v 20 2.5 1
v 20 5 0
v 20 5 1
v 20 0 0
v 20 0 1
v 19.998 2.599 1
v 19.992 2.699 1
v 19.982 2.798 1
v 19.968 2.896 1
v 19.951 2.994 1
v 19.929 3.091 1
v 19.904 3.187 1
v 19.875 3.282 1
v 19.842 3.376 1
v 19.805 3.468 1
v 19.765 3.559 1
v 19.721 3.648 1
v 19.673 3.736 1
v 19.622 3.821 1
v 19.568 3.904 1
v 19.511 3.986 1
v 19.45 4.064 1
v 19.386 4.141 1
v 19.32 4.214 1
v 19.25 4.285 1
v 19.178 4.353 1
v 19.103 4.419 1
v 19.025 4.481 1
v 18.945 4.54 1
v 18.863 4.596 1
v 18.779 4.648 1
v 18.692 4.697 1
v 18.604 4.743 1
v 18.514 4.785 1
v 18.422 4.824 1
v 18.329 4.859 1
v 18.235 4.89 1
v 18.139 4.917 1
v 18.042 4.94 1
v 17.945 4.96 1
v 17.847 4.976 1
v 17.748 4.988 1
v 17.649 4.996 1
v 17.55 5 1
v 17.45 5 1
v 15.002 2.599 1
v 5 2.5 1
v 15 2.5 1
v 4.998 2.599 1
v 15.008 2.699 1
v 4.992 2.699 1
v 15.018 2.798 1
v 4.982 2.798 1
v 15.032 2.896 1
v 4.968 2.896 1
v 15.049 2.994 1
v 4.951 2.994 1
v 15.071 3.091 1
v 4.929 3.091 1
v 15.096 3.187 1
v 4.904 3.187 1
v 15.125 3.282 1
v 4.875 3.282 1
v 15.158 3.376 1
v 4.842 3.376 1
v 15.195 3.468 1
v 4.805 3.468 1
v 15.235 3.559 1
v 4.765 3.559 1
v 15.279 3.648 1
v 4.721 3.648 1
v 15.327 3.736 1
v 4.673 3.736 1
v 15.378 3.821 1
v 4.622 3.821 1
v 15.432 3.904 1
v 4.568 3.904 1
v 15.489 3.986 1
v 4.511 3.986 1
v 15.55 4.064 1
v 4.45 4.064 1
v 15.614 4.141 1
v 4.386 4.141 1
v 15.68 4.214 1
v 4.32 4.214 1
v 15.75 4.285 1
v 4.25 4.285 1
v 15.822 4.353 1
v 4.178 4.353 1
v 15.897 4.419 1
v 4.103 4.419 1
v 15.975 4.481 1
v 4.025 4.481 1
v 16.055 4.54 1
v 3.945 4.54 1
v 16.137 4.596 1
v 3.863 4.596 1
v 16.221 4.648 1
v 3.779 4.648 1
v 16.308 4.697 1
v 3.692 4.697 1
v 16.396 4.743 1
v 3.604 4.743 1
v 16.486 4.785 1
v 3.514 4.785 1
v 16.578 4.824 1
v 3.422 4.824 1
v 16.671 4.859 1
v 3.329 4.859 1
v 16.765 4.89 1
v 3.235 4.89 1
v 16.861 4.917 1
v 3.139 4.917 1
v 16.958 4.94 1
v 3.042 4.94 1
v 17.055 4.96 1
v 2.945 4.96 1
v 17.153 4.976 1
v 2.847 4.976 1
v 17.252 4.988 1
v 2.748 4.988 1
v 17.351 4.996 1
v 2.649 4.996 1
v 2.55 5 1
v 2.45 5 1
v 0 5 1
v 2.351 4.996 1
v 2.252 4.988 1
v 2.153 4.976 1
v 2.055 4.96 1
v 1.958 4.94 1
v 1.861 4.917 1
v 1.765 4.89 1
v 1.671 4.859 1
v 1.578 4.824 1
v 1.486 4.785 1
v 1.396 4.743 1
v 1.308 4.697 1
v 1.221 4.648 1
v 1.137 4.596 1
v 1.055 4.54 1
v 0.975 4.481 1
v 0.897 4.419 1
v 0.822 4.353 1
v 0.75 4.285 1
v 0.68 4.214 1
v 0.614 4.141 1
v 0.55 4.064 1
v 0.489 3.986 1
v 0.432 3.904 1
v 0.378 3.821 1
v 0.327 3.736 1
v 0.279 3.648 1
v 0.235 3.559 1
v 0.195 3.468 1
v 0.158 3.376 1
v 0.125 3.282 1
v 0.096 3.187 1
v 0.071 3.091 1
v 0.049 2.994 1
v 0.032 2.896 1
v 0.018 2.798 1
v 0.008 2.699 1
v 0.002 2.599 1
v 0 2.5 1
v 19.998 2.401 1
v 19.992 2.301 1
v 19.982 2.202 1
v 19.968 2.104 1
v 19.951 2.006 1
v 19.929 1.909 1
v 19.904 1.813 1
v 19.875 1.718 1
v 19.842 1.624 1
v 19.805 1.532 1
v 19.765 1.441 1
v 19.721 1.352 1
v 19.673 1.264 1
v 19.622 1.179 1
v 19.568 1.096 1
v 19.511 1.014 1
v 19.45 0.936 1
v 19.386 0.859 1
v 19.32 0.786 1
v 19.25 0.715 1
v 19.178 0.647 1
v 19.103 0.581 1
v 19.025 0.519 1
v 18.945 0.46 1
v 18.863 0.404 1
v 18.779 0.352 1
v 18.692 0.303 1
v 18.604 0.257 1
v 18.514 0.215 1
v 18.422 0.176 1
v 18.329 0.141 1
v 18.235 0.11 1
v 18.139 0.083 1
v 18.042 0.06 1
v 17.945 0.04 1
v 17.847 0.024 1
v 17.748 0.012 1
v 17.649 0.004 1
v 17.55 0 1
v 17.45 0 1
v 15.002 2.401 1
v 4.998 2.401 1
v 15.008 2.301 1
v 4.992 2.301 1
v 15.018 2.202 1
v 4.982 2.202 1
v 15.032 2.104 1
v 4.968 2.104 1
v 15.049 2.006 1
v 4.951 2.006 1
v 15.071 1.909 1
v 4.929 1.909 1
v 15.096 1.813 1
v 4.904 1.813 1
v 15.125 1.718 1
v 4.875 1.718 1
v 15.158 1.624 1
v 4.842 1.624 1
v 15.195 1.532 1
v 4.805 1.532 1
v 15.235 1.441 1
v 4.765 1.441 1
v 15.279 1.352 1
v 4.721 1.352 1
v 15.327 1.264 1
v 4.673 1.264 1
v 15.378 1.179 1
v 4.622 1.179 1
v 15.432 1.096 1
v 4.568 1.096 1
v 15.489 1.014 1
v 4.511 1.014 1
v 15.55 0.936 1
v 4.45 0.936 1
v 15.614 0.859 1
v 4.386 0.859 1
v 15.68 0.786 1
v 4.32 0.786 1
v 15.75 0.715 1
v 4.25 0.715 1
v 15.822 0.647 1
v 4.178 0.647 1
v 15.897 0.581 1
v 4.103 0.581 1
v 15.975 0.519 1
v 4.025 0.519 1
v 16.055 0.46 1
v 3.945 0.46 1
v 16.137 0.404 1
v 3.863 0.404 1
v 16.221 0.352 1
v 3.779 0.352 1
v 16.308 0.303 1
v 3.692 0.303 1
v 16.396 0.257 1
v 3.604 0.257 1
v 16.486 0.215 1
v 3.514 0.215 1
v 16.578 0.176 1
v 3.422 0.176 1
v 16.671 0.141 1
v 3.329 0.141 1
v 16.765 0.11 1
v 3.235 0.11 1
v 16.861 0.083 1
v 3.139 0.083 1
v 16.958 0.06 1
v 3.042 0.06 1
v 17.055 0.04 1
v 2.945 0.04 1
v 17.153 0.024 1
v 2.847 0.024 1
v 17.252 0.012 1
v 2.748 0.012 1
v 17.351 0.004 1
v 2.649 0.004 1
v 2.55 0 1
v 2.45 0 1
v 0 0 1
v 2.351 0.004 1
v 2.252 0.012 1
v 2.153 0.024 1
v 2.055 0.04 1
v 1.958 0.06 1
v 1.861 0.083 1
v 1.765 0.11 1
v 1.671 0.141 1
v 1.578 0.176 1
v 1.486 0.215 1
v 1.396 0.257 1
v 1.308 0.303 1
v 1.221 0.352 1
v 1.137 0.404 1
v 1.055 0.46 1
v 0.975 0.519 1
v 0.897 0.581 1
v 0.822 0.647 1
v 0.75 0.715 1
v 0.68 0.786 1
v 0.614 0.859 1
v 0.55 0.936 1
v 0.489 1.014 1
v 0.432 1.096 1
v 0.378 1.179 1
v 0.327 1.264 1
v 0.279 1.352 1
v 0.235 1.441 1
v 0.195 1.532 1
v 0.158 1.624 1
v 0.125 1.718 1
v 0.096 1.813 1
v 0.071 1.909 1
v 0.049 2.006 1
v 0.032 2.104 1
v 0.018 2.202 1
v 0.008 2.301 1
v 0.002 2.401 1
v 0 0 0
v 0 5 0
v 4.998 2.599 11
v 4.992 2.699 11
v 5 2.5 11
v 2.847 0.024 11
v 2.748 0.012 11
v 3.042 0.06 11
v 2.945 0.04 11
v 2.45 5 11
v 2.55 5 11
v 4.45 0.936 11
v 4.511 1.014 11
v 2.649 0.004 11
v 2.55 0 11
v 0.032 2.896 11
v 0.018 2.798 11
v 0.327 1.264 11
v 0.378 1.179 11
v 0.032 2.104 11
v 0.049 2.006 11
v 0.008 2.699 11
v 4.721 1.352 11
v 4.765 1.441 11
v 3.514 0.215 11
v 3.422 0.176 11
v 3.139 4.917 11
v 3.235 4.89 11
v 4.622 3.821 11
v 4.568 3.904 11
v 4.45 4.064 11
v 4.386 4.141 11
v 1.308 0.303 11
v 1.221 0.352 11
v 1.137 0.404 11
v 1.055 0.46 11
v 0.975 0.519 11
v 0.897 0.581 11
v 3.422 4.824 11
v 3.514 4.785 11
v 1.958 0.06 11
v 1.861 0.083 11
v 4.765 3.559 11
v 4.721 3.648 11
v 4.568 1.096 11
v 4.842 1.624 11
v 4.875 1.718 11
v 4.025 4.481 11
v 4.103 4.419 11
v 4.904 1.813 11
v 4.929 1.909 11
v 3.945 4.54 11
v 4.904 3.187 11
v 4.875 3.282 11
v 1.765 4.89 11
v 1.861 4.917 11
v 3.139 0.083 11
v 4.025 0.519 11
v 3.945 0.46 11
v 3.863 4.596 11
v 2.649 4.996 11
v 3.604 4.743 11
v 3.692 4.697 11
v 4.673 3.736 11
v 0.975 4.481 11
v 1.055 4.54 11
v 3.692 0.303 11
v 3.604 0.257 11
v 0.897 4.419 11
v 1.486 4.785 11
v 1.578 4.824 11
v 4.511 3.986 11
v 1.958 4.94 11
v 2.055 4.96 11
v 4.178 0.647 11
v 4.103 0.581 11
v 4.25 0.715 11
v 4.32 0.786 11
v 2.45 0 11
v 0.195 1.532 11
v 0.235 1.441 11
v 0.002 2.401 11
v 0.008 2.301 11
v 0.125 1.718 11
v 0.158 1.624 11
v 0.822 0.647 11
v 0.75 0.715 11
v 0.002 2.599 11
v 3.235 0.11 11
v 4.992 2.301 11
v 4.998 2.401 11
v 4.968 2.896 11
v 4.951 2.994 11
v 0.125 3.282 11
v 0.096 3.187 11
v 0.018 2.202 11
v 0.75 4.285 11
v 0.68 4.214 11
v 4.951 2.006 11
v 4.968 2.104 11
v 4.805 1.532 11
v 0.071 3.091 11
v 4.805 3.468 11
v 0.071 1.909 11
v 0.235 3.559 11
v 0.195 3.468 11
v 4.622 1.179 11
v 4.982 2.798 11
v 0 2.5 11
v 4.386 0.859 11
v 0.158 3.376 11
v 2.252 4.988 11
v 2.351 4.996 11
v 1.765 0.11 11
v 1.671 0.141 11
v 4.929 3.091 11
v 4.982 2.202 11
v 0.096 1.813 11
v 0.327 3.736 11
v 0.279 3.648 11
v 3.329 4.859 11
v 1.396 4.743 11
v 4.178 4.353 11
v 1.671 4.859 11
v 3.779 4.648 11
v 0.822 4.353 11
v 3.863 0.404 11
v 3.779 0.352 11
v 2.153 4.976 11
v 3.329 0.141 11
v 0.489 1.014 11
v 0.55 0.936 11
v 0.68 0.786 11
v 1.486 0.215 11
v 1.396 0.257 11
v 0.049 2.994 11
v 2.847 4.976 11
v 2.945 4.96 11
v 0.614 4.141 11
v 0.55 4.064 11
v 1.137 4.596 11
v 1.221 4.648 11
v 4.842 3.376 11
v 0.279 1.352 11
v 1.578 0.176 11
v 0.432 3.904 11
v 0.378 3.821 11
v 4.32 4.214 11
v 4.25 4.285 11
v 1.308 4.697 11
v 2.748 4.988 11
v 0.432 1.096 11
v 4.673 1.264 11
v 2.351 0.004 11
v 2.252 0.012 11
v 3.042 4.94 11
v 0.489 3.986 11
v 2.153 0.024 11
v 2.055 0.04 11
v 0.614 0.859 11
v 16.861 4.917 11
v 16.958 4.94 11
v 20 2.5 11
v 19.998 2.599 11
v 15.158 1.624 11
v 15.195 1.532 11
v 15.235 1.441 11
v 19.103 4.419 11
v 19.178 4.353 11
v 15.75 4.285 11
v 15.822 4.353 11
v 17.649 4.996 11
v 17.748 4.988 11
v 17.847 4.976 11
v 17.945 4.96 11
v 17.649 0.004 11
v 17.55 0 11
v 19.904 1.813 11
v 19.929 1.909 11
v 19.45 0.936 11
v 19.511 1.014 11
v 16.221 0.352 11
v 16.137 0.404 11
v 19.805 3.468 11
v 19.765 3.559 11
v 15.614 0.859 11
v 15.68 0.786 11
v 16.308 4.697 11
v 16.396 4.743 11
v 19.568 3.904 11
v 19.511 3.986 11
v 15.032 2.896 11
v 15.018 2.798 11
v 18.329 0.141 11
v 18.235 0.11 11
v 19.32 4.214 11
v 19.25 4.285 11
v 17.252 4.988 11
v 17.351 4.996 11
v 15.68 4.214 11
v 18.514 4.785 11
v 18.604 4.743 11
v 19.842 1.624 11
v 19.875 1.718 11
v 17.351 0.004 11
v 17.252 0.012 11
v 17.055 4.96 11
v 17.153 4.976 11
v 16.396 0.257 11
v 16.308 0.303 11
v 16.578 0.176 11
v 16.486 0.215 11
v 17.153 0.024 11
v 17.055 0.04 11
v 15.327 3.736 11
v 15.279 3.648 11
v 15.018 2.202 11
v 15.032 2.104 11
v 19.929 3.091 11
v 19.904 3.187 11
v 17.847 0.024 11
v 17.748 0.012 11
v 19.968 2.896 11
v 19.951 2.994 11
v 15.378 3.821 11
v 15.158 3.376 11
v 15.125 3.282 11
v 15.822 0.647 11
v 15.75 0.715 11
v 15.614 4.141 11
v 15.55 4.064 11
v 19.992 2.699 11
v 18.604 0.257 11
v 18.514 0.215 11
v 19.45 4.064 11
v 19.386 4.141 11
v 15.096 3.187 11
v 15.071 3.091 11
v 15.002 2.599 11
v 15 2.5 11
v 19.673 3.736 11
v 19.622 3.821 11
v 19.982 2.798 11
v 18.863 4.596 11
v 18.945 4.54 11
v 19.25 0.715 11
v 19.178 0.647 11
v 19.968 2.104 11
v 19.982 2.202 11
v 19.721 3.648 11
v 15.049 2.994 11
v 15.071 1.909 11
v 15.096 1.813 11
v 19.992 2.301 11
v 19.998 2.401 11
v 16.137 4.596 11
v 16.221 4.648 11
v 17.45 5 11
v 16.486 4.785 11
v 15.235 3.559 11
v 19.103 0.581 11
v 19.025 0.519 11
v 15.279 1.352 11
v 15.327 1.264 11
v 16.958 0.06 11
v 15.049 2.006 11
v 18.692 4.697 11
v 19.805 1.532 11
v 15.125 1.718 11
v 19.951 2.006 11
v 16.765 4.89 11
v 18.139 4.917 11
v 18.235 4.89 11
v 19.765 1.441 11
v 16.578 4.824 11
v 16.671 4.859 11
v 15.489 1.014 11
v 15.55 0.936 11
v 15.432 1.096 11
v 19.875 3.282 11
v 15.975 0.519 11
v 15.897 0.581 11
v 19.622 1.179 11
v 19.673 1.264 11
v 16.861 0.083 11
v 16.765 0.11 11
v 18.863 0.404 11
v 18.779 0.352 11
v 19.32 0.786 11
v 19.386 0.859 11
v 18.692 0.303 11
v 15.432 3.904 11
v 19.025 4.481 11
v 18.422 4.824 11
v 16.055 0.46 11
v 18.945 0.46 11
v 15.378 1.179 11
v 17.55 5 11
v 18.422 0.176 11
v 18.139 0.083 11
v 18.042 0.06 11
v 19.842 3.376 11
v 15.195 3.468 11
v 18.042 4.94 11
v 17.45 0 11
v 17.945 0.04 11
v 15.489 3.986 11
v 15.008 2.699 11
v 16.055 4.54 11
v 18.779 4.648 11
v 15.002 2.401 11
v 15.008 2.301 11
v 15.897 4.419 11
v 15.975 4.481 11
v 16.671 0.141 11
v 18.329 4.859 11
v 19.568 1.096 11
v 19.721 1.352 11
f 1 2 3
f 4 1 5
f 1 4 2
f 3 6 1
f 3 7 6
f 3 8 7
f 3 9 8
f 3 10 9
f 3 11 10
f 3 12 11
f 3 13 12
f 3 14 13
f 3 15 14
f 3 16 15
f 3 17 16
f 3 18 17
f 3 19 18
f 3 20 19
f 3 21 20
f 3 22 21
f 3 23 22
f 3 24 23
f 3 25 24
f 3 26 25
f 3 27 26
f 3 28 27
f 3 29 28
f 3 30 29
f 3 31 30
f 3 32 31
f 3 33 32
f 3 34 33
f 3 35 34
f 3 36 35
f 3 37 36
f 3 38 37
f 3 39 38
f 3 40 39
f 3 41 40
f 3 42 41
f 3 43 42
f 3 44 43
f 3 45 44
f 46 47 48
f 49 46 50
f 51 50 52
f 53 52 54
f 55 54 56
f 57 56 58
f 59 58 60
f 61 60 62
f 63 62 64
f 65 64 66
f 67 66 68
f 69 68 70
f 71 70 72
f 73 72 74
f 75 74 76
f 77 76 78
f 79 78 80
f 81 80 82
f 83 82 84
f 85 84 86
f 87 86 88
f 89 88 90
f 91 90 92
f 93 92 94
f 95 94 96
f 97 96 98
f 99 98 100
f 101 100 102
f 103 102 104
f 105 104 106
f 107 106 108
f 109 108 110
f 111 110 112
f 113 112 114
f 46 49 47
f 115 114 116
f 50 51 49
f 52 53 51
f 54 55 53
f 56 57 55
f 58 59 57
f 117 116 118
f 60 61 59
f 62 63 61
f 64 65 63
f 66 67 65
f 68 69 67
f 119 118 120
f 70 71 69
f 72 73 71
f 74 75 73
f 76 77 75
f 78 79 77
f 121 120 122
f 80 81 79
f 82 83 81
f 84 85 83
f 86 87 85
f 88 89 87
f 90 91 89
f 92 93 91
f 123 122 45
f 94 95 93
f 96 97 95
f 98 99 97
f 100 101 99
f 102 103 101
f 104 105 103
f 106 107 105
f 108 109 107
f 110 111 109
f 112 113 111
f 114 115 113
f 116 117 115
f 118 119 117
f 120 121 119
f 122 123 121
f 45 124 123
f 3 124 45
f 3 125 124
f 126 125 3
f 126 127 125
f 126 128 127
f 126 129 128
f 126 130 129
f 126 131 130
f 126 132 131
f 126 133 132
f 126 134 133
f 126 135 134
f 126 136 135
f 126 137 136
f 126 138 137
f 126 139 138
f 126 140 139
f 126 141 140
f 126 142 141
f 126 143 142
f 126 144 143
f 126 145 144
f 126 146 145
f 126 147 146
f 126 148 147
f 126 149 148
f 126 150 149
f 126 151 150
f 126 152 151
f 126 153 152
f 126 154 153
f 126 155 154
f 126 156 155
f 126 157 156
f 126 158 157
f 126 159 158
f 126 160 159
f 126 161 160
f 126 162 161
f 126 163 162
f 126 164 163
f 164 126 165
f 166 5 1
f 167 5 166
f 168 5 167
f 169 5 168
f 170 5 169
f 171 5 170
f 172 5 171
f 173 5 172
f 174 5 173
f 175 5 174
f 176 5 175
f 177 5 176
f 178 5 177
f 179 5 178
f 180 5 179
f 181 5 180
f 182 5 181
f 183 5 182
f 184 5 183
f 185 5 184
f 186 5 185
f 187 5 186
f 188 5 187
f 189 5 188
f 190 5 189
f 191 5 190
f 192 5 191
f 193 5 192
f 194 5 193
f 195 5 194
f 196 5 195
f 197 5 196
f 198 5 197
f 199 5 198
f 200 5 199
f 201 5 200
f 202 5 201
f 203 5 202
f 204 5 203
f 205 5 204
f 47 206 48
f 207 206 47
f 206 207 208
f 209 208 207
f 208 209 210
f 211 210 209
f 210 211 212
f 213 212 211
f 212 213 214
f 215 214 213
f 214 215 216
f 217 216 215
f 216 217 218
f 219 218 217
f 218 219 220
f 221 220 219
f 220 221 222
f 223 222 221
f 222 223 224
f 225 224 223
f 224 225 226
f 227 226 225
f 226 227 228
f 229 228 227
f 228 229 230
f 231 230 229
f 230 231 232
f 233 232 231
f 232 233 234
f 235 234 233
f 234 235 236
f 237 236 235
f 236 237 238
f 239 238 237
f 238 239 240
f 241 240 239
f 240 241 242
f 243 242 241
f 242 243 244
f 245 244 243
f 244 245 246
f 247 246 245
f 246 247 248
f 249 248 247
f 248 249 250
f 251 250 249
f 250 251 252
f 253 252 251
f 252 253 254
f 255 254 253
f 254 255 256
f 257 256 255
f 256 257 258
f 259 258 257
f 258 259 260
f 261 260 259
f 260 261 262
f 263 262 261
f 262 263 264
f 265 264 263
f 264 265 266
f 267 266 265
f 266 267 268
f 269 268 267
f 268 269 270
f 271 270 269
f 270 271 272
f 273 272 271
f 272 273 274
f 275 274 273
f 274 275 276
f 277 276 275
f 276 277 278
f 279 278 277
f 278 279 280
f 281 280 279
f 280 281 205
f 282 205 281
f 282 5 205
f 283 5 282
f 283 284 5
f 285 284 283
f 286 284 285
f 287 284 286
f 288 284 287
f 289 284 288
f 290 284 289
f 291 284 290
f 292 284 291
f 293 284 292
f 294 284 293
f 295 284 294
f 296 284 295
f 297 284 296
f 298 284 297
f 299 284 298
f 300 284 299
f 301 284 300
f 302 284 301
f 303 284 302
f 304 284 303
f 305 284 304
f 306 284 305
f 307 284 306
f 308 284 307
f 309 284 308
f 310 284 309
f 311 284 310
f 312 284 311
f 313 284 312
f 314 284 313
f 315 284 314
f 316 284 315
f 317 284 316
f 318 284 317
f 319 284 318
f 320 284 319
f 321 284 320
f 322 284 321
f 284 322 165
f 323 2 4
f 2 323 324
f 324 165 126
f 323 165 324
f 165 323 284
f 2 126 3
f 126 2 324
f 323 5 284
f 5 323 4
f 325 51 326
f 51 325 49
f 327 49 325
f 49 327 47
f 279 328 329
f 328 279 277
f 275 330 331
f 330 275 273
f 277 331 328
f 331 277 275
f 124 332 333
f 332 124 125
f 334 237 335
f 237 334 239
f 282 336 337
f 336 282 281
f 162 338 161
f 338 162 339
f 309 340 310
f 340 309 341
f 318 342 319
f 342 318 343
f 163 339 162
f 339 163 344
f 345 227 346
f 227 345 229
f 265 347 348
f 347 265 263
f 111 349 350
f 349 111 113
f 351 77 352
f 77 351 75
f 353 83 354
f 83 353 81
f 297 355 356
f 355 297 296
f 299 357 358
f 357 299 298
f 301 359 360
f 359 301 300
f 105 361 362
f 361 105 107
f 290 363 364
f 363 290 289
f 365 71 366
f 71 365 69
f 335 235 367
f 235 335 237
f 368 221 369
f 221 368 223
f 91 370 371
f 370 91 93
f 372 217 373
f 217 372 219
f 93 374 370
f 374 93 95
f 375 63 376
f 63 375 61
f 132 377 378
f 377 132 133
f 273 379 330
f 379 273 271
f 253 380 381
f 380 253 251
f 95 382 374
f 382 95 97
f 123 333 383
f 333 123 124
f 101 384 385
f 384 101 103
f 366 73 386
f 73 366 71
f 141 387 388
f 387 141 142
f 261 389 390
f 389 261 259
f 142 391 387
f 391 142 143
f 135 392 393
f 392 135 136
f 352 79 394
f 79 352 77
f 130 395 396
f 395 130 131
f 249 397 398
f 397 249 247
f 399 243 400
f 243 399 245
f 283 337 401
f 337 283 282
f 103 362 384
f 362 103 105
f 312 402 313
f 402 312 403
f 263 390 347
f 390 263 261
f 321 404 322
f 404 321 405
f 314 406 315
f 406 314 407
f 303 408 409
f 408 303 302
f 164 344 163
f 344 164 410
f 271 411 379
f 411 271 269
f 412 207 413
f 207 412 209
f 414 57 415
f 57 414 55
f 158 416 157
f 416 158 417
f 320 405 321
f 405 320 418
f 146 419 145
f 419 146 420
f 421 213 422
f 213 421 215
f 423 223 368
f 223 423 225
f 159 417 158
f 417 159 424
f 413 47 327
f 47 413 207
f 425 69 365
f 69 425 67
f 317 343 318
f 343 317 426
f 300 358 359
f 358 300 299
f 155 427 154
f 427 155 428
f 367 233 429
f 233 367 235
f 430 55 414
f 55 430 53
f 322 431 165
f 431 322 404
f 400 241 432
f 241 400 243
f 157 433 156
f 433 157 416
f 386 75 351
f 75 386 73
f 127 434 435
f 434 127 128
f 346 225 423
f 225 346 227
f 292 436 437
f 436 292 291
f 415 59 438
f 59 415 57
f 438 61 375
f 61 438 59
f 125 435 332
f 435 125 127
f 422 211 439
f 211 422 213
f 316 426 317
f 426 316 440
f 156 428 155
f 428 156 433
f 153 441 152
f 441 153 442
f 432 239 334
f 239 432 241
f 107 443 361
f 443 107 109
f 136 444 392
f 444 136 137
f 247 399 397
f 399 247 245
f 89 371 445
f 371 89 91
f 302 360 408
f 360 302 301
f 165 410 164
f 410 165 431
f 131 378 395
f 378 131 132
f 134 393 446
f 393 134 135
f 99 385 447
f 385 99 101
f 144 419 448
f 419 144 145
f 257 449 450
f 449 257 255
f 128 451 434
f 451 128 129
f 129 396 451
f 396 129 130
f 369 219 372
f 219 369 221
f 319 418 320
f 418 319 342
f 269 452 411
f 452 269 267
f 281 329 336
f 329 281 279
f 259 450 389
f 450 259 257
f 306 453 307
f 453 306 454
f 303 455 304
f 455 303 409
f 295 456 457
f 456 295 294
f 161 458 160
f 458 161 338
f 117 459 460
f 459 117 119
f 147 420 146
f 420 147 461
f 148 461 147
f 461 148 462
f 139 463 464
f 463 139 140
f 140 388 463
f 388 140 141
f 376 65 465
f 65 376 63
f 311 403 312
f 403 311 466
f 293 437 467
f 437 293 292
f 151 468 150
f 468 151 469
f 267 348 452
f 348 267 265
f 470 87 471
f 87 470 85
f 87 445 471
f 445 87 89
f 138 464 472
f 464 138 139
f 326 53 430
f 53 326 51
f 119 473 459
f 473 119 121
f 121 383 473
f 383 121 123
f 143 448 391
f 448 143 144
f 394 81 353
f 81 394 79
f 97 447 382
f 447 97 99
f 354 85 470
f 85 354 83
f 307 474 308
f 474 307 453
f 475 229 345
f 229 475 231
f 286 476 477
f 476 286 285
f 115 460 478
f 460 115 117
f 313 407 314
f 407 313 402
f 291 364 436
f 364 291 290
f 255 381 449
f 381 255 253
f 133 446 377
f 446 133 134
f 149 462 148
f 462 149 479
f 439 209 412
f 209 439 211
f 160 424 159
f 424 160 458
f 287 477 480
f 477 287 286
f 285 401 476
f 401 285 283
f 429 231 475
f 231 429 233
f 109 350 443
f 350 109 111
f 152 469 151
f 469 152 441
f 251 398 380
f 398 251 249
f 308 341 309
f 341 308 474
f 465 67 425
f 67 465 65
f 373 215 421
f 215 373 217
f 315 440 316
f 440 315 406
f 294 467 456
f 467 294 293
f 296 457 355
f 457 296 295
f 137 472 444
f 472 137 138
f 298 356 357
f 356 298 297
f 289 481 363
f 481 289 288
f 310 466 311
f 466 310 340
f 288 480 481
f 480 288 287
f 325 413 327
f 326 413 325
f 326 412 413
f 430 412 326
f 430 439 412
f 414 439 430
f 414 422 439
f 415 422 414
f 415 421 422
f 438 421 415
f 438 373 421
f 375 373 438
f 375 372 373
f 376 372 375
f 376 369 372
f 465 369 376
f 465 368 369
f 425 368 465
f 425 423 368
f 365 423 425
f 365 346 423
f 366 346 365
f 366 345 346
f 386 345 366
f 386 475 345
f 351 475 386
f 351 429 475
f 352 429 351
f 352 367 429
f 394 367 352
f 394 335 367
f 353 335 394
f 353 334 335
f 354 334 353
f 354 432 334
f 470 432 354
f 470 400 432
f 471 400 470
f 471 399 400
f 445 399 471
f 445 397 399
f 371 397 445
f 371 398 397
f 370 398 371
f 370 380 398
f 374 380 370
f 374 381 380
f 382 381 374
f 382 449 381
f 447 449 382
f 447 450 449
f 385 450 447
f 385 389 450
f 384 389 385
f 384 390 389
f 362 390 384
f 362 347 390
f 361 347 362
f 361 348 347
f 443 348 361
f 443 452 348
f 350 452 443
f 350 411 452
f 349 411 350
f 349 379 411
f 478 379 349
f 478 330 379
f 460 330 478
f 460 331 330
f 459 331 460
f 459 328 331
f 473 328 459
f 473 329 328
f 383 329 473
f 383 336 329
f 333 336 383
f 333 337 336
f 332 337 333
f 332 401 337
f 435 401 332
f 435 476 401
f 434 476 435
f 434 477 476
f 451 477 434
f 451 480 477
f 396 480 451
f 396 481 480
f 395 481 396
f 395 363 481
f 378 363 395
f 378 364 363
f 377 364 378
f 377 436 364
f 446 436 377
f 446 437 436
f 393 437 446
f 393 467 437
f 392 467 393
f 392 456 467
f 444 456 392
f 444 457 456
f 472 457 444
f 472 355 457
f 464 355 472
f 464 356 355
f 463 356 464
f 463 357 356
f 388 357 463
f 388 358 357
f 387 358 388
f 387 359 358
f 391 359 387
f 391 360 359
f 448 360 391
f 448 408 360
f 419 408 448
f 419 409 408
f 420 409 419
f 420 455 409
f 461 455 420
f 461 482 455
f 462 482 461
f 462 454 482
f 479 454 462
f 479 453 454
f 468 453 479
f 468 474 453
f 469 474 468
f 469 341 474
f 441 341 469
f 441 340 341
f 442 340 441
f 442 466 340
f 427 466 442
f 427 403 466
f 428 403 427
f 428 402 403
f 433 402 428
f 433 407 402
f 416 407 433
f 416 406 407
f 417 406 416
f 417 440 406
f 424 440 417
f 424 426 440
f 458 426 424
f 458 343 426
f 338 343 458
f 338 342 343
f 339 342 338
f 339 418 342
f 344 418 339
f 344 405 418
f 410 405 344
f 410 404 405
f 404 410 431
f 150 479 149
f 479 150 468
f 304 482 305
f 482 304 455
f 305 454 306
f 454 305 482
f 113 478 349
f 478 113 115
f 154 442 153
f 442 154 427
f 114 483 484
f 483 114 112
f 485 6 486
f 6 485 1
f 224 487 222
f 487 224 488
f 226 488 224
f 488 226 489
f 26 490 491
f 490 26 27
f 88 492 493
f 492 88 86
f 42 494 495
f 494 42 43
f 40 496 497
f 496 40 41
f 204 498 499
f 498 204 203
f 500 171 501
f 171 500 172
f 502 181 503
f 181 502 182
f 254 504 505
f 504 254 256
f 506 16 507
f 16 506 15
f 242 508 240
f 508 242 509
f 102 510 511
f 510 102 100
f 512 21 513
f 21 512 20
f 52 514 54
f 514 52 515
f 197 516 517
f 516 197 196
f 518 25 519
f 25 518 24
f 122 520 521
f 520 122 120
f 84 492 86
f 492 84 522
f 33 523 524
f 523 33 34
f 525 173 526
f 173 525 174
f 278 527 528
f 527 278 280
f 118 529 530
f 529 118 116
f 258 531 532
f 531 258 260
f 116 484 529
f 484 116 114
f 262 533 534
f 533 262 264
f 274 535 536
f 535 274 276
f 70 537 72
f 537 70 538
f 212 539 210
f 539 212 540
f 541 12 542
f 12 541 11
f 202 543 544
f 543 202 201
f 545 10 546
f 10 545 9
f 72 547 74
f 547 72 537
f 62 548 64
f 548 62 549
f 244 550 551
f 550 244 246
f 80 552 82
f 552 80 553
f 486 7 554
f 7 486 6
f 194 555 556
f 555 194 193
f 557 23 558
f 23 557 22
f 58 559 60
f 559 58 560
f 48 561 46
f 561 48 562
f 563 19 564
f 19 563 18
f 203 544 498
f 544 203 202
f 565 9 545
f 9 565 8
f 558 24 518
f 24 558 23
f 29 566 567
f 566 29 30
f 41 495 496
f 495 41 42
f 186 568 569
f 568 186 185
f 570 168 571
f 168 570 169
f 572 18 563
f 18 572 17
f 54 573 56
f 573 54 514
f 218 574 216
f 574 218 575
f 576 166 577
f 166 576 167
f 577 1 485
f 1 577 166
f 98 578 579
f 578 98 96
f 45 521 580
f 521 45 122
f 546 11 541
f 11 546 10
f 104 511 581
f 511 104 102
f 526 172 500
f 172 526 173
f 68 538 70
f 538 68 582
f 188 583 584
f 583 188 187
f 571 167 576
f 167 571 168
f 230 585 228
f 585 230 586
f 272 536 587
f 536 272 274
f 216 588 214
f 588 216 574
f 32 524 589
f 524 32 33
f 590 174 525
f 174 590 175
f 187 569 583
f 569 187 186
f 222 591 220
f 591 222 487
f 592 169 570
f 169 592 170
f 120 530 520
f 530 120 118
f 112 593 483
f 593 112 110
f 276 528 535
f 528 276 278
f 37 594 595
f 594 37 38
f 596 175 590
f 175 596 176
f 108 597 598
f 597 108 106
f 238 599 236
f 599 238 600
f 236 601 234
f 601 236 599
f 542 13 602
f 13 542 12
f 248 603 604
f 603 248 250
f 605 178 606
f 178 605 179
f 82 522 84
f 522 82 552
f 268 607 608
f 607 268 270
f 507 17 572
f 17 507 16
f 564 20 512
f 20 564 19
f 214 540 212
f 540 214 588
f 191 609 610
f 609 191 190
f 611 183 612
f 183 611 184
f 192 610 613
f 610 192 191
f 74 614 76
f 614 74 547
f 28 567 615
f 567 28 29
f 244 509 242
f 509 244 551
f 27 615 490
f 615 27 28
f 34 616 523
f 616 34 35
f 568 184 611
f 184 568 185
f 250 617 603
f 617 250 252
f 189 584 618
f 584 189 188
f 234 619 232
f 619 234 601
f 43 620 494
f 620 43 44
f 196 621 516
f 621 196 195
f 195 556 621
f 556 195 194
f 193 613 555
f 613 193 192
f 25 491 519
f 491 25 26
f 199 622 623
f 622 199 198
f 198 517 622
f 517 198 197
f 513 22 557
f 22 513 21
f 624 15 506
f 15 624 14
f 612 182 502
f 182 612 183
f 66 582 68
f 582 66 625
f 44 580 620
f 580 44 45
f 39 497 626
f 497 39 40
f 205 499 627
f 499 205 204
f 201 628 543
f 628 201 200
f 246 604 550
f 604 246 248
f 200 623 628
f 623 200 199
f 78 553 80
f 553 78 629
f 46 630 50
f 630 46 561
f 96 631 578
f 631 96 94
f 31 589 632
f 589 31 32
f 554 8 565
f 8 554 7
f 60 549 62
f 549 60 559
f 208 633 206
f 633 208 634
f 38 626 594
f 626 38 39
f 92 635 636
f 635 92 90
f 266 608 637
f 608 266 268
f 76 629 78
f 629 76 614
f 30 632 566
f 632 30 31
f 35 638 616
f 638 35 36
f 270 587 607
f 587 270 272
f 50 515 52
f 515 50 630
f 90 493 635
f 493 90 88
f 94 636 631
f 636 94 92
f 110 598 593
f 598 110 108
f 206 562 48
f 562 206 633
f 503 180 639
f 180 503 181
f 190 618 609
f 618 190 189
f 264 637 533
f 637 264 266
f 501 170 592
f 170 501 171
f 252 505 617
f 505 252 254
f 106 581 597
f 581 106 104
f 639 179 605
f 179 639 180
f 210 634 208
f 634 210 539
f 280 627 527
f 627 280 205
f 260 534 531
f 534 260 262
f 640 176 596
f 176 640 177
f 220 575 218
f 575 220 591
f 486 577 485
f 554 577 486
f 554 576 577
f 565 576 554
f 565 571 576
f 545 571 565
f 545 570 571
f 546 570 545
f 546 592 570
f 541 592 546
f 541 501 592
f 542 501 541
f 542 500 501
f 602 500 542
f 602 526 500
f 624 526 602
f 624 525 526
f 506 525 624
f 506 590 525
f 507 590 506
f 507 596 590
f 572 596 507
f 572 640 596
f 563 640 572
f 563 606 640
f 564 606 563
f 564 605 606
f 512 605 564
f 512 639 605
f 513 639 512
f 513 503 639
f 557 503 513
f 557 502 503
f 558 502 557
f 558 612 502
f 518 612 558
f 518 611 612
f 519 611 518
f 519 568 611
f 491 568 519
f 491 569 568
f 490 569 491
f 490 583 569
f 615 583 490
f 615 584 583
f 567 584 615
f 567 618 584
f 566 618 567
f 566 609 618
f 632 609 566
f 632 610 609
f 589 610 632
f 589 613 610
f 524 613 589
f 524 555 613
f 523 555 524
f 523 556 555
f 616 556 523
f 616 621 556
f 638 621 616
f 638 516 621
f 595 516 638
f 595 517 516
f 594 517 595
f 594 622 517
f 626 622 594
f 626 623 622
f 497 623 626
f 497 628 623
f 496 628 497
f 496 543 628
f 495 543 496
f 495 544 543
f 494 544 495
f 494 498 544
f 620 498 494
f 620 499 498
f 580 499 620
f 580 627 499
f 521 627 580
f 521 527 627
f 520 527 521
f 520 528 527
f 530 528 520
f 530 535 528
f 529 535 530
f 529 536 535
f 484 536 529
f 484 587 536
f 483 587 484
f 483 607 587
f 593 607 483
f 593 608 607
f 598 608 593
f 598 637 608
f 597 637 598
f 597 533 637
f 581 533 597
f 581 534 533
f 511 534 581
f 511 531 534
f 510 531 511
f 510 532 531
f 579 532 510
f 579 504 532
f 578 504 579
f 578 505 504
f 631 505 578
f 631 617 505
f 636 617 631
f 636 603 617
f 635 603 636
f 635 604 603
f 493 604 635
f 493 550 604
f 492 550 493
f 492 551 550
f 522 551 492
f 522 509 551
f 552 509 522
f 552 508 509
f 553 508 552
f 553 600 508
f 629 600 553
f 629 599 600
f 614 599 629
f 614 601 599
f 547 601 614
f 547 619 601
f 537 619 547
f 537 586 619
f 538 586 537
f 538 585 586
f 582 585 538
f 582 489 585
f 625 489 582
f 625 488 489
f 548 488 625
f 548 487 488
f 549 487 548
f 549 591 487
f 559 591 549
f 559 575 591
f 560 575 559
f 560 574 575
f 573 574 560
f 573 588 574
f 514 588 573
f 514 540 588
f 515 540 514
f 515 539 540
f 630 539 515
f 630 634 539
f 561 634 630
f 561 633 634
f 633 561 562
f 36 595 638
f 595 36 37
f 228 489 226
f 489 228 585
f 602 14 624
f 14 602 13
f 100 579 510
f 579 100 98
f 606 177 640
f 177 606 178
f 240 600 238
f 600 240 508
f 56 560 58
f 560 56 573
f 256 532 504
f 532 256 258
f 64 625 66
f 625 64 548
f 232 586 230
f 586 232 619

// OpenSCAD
grid = [
    [1.0, 0], 
    [1.5, 0],
    [2.0, 0],
];

$fa = 0.1;
$fs = 0.1;

d = 5;
h = 10;
t = 1;
w = 20;


cube([w, d, t]);

translate([d/2, d/2, t])
cylinder(d = d, h = h);

translate([w-d/2, d/2, t])
cylinder(d = d, h = h);

/*
translate([d, w - d, t])
cylinder(d = d, h = h);

translate([w-d, w - d, t])
cylinder(d = d, h = h);*/
